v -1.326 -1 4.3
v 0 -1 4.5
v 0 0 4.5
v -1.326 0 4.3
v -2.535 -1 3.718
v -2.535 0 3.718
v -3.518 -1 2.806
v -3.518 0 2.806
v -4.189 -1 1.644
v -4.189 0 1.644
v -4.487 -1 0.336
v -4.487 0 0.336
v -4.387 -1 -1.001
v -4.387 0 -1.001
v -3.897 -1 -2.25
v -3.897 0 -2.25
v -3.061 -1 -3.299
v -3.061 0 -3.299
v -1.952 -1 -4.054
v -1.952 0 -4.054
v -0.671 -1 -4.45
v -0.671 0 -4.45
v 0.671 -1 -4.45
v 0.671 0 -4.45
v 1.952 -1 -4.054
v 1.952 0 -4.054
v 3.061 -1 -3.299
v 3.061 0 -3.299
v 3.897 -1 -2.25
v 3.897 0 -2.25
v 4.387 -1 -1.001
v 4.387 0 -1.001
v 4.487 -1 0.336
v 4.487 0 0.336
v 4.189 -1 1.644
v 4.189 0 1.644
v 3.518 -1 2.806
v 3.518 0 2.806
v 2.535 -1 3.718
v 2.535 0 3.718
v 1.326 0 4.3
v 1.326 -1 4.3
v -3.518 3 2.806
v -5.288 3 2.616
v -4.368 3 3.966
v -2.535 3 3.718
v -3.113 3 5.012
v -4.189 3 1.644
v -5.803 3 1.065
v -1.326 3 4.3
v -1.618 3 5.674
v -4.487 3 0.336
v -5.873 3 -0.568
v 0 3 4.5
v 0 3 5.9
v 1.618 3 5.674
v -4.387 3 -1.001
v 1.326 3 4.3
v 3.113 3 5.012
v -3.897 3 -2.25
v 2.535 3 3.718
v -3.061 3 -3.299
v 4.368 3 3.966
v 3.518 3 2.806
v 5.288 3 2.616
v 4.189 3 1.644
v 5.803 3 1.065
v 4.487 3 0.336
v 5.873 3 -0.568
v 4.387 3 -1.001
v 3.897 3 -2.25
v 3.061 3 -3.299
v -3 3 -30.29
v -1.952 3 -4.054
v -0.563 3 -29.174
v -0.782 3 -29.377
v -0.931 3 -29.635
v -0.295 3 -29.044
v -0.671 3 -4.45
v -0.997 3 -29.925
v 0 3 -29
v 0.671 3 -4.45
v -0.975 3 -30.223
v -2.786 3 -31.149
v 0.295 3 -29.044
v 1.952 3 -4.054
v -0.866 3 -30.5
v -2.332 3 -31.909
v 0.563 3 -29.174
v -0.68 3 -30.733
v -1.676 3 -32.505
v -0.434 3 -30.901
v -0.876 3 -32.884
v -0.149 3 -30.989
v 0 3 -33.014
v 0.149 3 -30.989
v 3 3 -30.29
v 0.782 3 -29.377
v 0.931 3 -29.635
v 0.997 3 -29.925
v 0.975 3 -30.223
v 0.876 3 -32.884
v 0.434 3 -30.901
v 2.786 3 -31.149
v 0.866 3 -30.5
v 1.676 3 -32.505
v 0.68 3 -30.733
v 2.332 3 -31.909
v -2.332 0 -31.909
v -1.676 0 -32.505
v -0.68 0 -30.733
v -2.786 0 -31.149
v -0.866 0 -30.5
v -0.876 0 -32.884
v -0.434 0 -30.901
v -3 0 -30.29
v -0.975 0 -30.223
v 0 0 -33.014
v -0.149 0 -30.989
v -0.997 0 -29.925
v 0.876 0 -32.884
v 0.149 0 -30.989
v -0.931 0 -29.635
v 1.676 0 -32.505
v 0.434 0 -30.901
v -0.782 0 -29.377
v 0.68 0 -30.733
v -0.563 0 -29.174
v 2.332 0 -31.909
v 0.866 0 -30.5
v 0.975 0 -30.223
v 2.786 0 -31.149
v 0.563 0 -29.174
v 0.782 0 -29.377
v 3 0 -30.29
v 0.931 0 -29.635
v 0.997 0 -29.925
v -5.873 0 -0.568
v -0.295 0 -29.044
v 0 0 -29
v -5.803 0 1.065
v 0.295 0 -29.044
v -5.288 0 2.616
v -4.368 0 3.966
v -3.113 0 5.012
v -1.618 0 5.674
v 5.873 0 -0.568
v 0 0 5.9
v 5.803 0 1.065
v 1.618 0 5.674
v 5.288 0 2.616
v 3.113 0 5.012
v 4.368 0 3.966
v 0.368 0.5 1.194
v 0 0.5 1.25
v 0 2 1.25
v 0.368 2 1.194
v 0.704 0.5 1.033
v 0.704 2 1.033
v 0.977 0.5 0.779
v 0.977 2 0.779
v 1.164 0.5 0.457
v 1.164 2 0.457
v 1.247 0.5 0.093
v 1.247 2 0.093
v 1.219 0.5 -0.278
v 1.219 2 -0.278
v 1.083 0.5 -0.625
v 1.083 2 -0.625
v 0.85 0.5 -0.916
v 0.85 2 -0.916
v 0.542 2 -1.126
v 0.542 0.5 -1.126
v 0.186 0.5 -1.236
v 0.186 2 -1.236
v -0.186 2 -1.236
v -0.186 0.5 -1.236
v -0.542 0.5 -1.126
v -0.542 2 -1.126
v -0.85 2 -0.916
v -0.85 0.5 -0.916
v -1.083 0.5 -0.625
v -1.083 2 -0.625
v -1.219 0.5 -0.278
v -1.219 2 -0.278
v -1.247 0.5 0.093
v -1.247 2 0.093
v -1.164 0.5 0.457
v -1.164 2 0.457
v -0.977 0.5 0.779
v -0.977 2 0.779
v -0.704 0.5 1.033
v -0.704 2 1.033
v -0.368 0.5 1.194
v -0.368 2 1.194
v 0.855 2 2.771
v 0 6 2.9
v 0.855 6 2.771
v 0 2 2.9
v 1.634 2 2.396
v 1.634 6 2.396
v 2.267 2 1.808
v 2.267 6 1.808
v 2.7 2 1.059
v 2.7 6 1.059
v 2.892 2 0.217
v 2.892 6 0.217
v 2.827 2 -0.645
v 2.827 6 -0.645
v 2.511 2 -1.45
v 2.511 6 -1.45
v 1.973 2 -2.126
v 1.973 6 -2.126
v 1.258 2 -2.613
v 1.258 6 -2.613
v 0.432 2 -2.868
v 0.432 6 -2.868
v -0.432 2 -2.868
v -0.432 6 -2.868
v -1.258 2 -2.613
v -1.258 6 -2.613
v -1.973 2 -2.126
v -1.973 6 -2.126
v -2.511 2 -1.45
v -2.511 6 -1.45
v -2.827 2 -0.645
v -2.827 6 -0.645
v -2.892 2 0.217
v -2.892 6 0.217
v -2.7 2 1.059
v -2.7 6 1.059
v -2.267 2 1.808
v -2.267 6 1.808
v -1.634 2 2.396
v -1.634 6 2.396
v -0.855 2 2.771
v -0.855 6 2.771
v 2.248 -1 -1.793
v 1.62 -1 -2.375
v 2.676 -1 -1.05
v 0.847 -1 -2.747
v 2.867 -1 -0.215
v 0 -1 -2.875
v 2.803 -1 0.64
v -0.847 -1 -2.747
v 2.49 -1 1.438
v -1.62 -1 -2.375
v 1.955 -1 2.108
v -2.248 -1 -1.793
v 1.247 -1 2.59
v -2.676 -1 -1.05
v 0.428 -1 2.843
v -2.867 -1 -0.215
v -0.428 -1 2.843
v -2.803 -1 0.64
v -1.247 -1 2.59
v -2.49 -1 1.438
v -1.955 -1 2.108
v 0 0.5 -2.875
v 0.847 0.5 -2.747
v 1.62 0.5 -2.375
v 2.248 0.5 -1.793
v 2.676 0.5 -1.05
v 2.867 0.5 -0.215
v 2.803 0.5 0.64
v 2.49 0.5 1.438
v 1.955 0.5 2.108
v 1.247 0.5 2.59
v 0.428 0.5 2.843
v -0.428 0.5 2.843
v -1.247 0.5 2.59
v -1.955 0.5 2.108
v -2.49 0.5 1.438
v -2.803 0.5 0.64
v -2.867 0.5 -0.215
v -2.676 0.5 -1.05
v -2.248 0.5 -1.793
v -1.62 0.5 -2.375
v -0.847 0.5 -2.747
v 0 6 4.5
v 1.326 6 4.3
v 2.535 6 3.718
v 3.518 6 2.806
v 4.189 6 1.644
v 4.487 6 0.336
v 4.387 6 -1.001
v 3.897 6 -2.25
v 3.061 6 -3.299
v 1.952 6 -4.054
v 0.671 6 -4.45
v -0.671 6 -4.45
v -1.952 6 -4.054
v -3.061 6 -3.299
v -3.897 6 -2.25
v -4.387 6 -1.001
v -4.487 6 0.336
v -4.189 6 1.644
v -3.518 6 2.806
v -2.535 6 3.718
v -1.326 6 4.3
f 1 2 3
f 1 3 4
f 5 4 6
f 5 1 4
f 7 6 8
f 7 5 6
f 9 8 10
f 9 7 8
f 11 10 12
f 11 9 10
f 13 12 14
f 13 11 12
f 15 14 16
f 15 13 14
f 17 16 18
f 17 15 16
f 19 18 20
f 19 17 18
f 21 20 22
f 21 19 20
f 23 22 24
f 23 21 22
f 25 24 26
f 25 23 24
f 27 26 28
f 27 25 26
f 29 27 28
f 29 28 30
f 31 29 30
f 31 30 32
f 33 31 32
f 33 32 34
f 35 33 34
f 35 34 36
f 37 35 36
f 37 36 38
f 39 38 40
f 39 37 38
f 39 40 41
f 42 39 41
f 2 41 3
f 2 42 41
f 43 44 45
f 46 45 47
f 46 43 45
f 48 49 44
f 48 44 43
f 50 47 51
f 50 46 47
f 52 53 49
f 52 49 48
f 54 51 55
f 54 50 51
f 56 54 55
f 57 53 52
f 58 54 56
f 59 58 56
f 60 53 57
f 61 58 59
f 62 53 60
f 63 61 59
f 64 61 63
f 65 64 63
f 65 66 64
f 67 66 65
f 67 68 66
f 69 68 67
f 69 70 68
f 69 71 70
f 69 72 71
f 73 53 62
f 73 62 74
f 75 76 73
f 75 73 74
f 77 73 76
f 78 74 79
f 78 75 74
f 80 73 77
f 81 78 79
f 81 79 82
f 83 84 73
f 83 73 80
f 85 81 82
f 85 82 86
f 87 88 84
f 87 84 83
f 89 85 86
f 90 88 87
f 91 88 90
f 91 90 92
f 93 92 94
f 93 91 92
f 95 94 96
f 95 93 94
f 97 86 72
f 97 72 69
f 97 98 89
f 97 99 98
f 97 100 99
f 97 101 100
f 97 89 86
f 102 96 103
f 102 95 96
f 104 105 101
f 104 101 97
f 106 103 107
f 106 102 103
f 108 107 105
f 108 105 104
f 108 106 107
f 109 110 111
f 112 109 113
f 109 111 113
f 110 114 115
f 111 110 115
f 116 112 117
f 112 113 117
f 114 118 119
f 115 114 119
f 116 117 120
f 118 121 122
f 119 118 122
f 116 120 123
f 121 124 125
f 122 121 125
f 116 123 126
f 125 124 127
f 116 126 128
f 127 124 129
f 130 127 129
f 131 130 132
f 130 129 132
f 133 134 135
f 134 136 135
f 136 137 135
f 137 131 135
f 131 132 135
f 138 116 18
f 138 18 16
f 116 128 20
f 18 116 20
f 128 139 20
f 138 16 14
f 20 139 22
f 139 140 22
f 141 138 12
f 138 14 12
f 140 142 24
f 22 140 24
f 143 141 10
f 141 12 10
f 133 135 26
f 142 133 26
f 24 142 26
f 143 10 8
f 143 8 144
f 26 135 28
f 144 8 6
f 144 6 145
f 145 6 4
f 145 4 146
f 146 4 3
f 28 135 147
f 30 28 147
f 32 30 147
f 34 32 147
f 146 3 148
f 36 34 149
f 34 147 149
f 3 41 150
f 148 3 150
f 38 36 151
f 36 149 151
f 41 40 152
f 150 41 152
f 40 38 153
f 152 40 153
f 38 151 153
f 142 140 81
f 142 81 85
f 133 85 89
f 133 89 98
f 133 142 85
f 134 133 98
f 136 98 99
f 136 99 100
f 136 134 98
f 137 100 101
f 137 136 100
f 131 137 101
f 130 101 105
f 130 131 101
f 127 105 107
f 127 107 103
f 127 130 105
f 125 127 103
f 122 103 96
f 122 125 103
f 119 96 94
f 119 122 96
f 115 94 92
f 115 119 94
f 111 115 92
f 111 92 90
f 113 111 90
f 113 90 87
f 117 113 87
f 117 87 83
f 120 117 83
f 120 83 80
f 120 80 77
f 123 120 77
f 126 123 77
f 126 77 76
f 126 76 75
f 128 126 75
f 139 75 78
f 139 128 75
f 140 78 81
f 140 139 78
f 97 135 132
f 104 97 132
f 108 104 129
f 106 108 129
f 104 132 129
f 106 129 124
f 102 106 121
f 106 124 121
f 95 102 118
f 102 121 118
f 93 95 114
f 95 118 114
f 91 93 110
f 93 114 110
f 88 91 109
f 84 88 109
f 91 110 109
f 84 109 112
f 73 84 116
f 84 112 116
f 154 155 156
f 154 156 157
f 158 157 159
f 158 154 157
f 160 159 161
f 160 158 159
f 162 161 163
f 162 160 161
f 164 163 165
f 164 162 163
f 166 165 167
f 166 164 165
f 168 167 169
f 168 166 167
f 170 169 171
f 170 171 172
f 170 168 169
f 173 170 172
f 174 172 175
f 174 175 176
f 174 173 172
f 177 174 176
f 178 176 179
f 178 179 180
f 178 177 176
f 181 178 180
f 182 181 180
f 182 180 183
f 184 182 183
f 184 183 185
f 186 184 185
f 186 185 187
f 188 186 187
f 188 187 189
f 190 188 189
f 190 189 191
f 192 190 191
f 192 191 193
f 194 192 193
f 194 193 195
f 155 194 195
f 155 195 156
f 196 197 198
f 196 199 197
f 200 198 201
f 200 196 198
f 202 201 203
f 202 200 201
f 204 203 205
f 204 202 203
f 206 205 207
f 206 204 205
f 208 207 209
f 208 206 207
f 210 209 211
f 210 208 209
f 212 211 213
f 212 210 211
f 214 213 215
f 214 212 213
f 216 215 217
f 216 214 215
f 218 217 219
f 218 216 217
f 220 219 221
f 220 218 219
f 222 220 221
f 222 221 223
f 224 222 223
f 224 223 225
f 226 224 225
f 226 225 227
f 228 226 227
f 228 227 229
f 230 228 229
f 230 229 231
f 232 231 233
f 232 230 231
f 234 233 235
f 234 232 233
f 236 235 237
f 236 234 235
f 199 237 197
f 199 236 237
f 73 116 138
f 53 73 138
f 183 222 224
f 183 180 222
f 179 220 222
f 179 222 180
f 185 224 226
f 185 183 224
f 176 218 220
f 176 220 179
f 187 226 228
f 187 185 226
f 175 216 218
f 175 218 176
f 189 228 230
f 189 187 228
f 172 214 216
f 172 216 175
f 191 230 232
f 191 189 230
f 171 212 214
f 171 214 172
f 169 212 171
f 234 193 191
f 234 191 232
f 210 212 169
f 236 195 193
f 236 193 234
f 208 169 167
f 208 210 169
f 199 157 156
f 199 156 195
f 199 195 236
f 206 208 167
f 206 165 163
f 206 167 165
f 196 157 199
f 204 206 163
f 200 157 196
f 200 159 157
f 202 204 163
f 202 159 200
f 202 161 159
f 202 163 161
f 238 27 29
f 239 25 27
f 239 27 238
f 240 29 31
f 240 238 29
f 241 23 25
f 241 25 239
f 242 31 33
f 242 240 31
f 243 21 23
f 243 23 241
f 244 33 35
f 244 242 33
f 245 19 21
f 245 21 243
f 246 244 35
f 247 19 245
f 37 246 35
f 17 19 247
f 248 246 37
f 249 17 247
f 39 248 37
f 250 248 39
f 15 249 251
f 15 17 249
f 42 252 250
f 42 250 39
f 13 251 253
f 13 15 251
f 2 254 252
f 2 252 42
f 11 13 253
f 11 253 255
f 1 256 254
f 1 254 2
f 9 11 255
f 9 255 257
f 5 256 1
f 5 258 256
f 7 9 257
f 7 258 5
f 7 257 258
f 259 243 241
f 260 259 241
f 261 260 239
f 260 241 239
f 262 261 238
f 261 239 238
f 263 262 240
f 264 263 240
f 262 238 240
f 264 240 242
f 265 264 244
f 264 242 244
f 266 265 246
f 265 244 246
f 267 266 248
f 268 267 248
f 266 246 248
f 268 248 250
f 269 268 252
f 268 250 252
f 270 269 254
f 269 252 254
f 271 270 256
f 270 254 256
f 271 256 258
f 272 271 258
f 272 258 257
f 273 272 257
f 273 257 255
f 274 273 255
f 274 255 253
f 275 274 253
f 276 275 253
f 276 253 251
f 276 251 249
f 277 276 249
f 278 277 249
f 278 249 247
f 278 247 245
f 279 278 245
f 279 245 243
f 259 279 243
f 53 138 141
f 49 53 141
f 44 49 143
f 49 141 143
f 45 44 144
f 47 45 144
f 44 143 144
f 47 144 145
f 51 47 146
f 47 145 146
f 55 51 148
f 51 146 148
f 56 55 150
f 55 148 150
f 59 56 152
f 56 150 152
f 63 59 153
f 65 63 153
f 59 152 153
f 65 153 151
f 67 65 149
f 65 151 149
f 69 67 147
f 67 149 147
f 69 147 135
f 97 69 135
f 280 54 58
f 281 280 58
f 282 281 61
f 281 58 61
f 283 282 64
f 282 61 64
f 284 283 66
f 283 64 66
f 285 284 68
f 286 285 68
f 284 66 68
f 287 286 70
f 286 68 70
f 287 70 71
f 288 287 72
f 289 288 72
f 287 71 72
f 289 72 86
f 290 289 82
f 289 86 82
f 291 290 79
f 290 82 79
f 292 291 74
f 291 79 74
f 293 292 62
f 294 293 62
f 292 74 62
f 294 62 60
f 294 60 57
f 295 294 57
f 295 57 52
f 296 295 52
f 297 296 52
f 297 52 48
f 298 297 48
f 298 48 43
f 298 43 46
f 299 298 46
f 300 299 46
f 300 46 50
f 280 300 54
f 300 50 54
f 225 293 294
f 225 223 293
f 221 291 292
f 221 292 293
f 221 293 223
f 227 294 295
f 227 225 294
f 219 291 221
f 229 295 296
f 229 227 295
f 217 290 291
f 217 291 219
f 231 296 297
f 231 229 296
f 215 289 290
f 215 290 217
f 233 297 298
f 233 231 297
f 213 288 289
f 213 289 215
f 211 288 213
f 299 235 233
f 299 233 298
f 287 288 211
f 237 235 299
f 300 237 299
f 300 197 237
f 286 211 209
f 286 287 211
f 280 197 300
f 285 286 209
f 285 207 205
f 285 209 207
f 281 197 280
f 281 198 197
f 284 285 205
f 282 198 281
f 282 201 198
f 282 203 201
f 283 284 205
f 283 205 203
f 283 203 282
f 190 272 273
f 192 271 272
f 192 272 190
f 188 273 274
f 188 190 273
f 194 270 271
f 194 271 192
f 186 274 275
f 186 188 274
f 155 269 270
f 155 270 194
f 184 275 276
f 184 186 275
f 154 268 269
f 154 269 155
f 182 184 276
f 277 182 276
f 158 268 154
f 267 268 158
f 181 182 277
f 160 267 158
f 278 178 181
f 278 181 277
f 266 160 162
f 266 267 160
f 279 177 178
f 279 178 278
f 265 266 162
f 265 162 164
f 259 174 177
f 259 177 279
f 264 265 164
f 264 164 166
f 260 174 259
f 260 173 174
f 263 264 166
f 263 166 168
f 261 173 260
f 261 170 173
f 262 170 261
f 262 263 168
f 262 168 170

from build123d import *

# Parameters (mm, degrees)
SKETCH2_R           = 2.9
SKETCH2_R_2         = 1
BOSS_EXTRUDE1_DEPTH = 3
SKETCH2_4_R         = 2.9
SKETCH2_4_R_2       = 1.25
BOSS_EXTRUDE2_DEPTH = 2
SKETCH7_R           = 4.5
SKETCH7_R_2         = 2.9
BOSS_EXTRUDE3_DEPTH = 3
BOSS_EXTRUDE4_START = 1
SKETCH8_R           = 4.5
SKETCH8_R_2         = 2.875
BOSS_EXTRUDE4_DEPTH = 1
SKETCH9_R           = 2.875
CUT_EXTRUDE2_DEPTH  = 0.5


with BuildPart() as part:
    # Sketch2 → Boss-Extrude1 (new body)
    with BuildSketch(Plane(origin=(0, 0, 0), x_dir=(1, 0, 0), z_dir=(0, 1, 0))):
        with BuildLine():
            ThreePointArc((3, 30.28994689), (0, 33.013978965), (-3, 30.28994689))
            Line((-3, 30.28994689), (-5.872635545, 0.567584137))
            ThreePointArc((-5.872635545, 0.567584137), (0, -5.9), (5.872635545, 0.567584137))
            Line((5.872635545, 0.567584137), (3, 30.28994689))
        make_face()
        Circle(SKETCH2_R, mode=Mode.SUBTRACT)
        with Locations((0, 30)):
            Circle(SKETCH2_R_2, mode=Mode.SUBTRACT)
    extrude(amount=BOSS_EXTRUDE1_DEPTH)

    # Sketch2<4> → Boss-Extrude2 (add)
    with BuildSketch(Plane(origin=(0, 0, 0), x_dir=(1, 0, 0), z_dir=(0, 1, 0))):
        Circle(SKETCH2_4_R)
        Circle(SKETCH2_4_R_2, mode=Mode.SUBTRACT)
    extrude(amount=BOSS_EXTRUDE2_DEPTH)

    # Sketch7 → Boss-Extrude3 (add)
    with BuildSketch(Plane(origin=(0, 3, 0), x_dir=(1, 0, 0), z_dir=(0, 1, 0))):
        Circle(SKETCH7_R)
        Circle(SKETCH7_R_2, mode=Mode.SUBTRACT)
    extrude(amount=BOSS_EXTRUDE3_DEPTH)

    # Sketch8 → Boss-Extrude4 (add)
    with BuildSketch(Plane.XZ.offset(BOSS_EXTRUDE4_START)):
        Circle(SKETCH8_R)
        Circle(SKETCH8_R_2, mode=Mode.SUBTRACT)
    extrude(amount=-BOSS_EXTRUDE4_DEPTH)

    # Sketch9 → Cut-Extrude2 (cut)
    with BuildSketch(Plane.XZ):
        Circle(SKETCH9_R)
    extrude(amount=-CUT_EXTRUDE2_DEPTH, mode=Mode.SUBTRACT)


solid = part.part
